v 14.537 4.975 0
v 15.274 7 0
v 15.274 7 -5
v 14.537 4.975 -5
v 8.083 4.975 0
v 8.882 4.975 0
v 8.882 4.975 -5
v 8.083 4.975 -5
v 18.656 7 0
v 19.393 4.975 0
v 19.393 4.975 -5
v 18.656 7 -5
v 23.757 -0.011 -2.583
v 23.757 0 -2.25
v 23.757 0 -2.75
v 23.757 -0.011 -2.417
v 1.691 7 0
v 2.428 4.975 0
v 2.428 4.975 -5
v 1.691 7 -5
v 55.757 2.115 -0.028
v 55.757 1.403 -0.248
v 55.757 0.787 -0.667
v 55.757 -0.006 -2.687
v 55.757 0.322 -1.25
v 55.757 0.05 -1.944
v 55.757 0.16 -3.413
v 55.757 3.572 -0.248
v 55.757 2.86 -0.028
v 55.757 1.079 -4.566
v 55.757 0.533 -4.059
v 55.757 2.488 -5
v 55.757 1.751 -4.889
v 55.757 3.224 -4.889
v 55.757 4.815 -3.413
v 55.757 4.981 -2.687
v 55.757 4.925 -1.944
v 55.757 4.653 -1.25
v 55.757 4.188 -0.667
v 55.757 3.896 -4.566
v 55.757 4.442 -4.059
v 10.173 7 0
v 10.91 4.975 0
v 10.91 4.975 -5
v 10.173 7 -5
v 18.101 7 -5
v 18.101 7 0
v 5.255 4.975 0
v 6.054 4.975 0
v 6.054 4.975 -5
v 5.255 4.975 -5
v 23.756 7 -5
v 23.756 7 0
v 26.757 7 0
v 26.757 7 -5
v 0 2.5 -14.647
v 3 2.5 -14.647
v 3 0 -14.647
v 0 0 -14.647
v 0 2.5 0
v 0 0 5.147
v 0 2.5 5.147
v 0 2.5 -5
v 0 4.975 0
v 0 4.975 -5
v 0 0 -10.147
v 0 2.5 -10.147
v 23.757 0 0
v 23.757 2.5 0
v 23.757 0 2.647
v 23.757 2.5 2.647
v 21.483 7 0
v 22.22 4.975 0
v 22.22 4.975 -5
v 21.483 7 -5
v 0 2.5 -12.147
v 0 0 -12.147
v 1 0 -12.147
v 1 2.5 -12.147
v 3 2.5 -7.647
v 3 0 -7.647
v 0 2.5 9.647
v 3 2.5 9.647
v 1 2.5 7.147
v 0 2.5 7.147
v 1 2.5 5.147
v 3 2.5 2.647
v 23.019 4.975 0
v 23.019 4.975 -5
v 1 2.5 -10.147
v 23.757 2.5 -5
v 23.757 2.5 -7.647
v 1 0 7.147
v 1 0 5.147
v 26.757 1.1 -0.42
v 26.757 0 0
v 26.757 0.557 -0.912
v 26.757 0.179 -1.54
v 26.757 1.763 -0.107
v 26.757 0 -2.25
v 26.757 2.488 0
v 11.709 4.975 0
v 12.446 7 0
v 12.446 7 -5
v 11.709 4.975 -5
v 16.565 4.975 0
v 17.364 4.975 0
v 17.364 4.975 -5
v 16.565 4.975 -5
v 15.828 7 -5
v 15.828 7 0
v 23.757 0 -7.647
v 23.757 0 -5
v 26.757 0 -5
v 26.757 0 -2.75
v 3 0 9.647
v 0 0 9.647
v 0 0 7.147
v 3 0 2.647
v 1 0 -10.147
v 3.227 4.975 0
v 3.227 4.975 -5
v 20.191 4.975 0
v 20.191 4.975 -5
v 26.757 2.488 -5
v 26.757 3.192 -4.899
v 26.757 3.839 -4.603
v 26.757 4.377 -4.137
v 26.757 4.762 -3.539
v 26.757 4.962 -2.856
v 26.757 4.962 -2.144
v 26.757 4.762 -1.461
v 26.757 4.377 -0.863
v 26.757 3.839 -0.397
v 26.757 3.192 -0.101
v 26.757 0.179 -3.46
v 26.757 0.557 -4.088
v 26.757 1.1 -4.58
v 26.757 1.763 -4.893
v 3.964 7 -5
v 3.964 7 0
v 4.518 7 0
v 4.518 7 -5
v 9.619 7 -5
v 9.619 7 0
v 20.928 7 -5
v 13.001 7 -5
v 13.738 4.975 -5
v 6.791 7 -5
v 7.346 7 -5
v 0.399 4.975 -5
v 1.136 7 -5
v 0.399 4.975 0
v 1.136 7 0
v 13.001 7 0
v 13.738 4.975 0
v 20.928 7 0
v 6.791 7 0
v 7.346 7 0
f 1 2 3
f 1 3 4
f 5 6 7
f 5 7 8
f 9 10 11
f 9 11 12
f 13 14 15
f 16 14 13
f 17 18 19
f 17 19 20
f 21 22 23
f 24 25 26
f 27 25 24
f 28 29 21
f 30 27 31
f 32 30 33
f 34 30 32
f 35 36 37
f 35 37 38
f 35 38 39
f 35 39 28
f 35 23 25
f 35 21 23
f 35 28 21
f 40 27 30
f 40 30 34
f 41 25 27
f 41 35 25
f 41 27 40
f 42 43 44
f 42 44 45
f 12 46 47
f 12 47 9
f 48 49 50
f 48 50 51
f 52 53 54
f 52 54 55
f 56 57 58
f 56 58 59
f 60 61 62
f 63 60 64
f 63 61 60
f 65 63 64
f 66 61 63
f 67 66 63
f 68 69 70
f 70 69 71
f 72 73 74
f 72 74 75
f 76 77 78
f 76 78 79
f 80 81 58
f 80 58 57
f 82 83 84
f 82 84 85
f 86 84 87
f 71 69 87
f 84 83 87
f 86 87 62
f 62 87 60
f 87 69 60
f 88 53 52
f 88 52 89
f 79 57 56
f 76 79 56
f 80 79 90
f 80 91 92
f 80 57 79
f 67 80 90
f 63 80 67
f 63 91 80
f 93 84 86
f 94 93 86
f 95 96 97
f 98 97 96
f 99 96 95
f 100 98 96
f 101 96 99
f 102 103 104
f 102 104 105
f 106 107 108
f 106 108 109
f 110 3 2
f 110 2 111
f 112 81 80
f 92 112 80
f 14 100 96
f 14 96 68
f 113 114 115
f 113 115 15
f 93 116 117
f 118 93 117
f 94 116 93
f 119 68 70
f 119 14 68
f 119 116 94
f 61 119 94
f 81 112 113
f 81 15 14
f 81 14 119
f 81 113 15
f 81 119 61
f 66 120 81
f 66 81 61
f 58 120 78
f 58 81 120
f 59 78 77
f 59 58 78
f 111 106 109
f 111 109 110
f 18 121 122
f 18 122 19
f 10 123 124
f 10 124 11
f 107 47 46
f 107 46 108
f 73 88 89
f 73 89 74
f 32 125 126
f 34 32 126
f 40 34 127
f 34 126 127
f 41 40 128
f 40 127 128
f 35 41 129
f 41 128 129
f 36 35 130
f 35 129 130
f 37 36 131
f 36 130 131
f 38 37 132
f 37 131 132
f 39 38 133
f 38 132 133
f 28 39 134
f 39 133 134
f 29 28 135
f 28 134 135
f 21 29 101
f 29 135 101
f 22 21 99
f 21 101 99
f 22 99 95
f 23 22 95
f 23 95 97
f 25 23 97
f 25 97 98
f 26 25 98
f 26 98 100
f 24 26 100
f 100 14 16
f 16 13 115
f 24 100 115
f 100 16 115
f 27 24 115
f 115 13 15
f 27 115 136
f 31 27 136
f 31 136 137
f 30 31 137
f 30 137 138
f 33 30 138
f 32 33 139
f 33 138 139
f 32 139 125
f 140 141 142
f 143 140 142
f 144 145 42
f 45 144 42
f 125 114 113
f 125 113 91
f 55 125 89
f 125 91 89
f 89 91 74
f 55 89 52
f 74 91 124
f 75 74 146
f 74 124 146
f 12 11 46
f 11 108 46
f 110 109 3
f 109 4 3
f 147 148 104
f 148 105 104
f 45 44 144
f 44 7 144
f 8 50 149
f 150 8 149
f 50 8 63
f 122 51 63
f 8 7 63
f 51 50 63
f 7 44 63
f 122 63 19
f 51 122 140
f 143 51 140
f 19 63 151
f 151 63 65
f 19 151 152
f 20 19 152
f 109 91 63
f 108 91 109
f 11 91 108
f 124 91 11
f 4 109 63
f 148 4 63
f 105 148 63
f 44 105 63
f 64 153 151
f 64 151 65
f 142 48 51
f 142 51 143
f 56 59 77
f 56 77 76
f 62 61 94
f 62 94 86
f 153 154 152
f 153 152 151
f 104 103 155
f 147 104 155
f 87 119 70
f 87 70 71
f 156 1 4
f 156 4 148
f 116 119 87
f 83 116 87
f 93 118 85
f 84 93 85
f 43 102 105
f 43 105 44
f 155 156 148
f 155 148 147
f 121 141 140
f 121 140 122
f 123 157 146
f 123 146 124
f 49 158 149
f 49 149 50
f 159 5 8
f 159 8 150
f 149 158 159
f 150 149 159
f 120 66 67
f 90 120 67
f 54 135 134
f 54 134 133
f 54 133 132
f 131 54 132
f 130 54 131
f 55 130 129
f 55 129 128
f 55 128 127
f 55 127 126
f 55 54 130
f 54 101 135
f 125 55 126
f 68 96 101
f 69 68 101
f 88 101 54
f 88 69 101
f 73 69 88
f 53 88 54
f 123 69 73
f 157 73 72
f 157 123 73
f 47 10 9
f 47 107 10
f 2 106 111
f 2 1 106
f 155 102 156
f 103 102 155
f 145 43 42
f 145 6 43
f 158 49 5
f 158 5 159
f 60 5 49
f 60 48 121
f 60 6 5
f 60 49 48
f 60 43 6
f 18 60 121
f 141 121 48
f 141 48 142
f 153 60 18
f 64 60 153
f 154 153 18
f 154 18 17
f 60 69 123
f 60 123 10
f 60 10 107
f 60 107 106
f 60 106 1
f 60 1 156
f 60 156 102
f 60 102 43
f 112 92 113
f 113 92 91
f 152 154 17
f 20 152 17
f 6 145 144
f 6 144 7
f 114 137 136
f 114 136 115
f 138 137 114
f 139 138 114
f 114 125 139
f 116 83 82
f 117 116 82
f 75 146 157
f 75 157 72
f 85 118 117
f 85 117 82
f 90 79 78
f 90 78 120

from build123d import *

# Parameters (mm, degrees)
BLANKSKE_W          = 23.757
BLANKSKE_H          = 7
BLANK_DEPTH         = 5
TOOTHCUTSIM_DEPTH   = 26.26648074
TEETHCUTS_COUNT     = 9
TEETHCUTS_PITCH     = 2.827433385
SKETCH1_R           = 2.5
BOSS_EXTRUDE1_DEPTH = 32
SKETCH2_W           = 2.647496805
SKETCH2_H           = 2.5
BOSS_EXTRUDE2_DEPTH = 23.757
SKETCH3_W           = 5
SKETCH3_H           = 7
BOSS_EXTRUDE3_DEPTH = 3
SKETCH4_W           = 3
SKETCH4_H           = 2.5
BOSS_EXTRUDE4_DEPTH = 7
SKETCH5_W           = 2
SKETCH5_H           = 2.5
CUT_EXTRUDE1_DEPTH  = 1


with BuildPart() as part:
    # BlankSke → Blank (new body)
    with BuildSketch(Plane.XY):
        with Locations((11.8785, 3.5)):
            Rectangle(BLANKSKE_W, BLANKSKE_H)
    extrude(amount=-BLANK_DEPTH)

    # TooCutSkeSim → ToothCutSim (cut, through all)
    with BuildSketch(Plane.XY):
        Polygon((0.399391833, 4.975), (-0.399391833, 4.975), (-1.145676401, 7.0254), (1.145676401, 7.0254), align=None)
    toothcutsim = extrude(amount=-TOOTHCUTSIM_DEPTH, mode=Mode.SUBTRACT)

    # TeethCuts: ToothCutSim ×9
    with Locations(*[(i * TEETHCUTS_PITCH, 0, 0) for i in range(1, TEETHCUTS_COUNT)]):
        add(toothcutsim, mode=Mode.SUBTRACT)

    # Sketch1 → Boss-Extrude1 (add)
    with BuildSketch(Plane(origin=(23.757, 0, 0), x_dir=(0, 0, -1), z_dir=(1, 0, 0))):
        with Locations((2.5, 2.4875)):
            Circle(SKETCH1_R)
    extrude(amount=BOSS_EXTRUDE1_DEPTH)

    # Sketch2 → Boss-Extrude2 (add)
    with BuildSketch(Plane.ZY):
        with Locations((-6.323748402, 1.25)):
            Rectangle(SKETCH2_W, SKETCH2_H)
        with Locations((1.323748403, 1.25)):
            Rectangle(SKETCH2_W, SKETCH2_H)
    extrude(amount=-BOSS_EXTRUDE2_DEPTH)

    # Sketch3 → Boss-Extrude3 (add)
    with BuildSketch(Plane(origin=(23.757, 0, 0), x_dir=(0, 0, -1), z_dir=(1, 0, 0))):
        with Locations((2.5, 3.5)):
            Rectangle(SKETCH3_W, SKETCH3_H)
    extrude(amount=BOSS_EXTRUDE3_DEPTH)

    # Sketch4 → Boss-Extrude4 (add)
    with BuildSketch(Plane(origin=(0, 0, -7.647496805), x_dir=(-1, 0, 0), z_dir=(0, 0, -1))):
        with Locations((-1.5, 1.25)):
            Rectangle(SKETCH4_W, SKETCH4_H)
    boss_extrude4 = extrude(amount=BOSS_EXTRUDE4_DEPTH)

    # Mirror1: Boss-Extrude4 across plane
    add(boss_extrude4.mirror(Plane(origin=(0, 0, -2.5), x_dir=(1, 0, 0), z_dir=(0, 0, -1))))

    # Sketch5 → Cut-Extrude1 (cut)
    with BuildSketch(Plane.ZY):
        with Locations((-11.147496805, 1.25)):
            Rectangle(SKETCH5_W, SKETCH5_H)
    cut_extrude1 = extrude(amount=-CUT_EXTRUDE1_DEPTH, mode=Mode.SUBTRACT)

    # Mirror2: Cut-Extrude1 across plane
    add(cut_extrude1.mirror(Plane(origin=(0, 0, -2.5), x_dir=(1, 0, 0), z_dir=(0, 0, -1))), mode=Mode.SUBTRACT)


solid = part.part
